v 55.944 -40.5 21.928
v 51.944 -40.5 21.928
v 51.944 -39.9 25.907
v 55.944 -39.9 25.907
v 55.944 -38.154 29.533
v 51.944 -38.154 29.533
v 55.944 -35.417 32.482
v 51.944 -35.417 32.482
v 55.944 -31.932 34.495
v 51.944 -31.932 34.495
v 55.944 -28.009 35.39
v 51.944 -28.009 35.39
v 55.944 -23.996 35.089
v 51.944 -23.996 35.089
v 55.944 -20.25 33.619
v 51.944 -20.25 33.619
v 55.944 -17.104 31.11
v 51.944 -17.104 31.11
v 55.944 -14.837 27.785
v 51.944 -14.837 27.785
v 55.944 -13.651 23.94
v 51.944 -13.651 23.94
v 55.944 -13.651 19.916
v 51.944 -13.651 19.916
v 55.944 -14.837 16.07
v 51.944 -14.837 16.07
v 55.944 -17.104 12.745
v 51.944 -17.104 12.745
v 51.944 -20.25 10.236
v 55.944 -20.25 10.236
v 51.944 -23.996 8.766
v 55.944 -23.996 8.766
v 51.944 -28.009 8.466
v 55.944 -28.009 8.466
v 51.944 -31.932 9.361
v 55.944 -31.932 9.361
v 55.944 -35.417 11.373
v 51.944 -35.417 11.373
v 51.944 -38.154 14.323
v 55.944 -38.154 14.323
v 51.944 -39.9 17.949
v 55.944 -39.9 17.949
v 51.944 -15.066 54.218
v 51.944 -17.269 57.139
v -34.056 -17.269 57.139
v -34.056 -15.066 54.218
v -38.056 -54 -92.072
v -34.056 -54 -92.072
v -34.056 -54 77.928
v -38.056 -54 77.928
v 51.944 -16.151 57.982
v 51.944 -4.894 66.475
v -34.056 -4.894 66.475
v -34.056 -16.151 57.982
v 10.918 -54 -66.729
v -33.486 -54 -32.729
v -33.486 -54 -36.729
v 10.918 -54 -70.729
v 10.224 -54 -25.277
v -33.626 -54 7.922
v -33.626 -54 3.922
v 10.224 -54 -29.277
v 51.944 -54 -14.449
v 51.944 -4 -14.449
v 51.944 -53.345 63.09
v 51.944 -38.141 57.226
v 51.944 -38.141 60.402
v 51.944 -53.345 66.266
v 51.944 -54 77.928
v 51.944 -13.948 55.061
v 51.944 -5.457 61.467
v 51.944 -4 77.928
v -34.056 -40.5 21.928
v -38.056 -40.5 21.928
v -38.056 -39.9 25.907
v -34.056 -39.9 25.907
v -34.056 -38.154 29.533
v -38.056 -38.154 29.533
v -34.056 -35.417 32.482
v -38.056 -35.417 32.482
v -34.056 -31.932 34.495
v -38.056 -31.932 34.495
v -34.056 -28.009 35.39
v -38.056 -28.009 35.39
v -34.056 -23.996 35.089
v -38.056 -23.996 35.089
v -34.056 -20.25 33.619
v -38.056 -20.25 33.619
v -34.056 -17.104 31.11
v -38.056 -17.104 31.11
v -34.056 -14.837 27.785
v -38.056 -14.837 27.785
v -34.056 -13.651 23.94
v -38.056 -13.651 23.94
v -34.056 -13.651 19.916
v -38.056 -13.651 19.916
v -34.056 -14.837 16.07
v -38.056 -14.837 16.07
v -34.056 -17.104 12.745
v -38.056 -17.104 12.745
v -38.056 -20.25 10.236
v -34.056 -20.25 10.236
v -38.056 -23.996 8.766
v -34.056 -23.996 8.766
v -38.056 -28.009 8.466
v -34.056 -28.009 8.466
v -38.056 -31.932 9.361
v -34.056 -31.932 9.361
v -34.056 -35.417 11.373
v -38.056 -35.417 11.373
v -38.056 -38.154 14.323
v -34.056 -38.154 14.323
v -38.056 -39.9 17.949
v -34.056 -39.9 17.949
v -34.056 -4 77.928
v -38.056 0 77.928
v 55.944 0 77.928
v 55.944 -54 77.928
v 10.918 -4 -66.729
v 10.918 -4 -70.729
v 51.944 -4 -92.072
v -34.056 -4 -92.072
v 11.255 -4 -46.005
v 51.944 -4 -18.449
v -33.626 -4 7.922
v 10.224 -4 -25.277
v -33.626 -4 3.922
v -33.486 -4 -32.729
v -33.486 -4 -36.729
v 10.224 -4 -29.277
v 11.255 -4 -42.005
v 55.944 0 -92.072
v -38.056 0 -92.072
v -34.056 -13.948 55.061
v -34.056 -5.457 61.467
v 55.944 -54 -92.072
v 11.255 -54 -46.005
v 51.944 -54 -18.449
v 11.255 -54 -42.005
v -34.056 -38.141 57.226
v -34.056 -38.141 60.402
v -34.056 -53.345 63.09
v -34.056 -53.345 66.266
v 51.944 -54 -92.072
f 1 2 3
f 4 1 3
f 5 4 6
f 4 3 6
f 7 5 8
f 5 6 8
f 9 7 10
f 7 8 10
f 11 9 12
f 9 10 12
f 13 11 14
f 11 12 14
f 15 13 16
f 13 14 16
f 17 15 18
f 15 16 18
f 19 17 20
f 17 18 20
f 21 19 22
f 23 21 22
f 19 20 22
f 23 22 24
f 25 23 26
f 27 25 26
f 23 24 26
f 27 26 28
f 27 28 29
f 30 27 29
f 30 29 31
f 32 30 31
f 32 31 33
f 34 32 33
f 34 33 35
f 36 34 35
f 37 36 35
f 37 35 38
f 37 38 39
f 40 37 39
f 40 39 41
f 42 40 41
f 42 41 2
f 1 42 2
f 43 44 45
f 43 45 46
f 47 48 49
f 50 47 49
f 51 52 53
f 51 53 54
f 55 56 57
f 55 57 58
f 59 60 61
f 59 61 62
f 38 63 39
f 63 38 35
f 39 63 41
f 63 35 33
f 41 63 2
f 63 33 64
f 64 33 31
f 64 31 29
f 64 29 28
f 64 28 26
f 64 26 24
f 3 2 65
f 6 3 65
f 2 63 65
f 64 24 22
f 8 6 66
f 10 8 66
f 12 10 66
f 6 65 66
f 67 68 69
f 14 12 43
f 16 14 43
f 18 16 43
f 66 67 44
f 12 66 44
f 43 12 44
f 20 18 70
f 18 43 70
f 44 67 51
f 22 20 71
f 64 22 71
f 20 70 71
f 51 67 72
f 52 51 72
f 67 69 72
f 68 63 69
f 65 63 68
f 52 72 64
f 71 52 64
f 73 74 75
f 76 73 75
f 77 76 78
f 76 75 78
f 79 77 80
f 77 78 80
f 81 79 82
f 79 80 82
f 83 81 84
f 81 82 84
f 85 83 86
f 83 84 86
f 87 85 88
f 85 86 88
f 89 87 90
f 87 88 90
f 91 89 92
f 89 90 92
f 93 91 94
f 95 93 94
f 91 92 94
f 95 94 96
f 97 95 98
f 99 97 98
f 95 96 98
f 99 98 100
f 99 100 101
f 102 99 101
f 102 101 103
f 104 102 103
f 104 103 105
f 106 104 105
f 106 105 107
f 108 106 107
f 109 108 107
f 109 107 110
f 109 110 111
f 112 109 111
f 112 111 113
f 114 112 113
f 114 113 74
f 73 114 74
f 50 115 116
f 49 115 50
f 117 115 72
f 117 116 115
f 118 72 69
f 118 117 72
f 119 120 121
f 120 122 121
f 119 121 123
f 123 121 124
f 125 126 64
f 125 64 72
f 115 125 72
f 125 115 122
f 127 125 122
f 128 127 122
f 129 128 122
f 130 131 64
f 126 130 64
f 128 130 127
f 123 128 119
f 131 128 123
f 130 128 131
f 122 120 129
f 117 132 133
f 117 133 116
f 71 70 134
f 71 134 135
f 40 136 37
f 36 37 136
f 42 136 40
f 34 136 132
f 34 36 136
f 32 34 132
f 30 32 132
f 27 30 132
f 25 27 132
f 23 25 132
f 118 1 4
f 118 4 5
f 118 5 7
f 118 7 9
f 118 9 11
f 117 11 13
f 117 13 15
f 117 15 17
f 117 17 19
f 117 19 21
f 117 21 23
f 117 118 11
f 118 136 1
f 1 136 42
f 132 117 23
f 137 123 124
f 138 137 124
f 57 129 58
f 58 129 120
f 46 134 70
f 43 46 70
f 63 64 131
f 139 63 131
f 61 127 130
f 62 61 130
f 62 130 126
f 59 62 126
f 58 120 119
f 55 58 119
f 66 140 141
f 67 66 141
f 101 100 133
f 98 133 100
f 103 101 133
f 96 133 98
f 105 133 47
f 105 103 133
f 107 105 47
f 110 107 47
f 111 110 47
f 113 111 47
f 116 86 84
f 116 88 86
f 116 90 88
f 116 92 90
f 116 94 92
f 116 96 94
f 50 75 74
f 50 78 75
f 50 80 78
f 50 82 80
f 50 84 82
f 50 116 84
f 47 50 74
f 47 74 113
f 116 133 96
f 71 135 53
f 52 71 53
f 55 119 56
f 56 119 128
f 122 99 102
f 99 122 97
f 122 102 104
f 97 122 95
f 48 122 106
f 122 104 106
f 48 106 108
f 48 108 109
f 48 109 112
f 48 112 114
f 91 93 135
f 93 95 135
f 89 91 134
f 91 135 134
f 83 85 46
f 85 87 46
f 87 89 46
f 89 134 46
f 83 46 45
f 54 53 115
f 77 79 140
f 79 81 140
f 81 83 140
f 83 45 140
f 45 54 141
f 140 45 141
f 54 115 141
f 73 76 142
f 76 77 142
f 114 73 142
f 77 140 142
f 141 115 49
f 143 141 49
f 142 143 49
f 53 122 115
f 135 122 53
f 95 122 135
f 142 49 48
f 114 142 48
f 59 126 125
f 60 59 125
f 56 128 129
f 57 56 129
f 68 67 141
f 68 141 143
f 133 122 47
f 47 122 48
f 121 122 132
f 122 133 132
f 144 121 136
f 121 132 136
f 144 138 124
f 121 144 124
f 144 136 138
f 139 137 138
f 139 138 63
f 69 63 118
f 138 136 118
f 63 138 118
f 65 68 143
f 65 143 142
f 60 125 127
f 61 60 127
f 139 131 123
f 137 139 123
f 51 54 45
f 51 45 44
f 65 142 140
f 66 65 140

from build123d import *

# Parameters (mm, degrees)
F0_W      = 90
F0_H      = 170
F1_DEPTH  = 4
F2_W      = 50
F2_H      = 170
F3_DEPTH  = 4
F4_W      = 50
F4_H      = 170
F5_DEPTH  = 4
F6_DEPTH  = 4
F9_D      = 27
F13_DEPTH = 88.2
F15_DEPTH = 87.7
F16_DEPTH = 1.4
F21_DEPTH = 50
F23_DEPTH = 50
F25_DEPTH = 50


with BuildPart() as f1:
    # F0 (on Front) → F1 (new body)
    with BuildSketch(Plane.XZ):
        with Locations((10.9441001713, -7.0722334087)):
            Rectangle(F0_W, F0_H)
    extrude(amount=F1_DEPTH)

    # F2 (on face) → F3 (join)
    with BuildSketch(Plane.YZ.offset(55.9441001713)):
        with Locations((-29, -7.0722334087)):
            Rectangle(F2_W, F2_H)
    extrude(amount=-F3_DEPTH)


with BuildPart() as f5:
    # F4 (on face) → F5 (new body)
    with BuildSketch(Plane(origin=(-34.0558998287, 0, 0), x_dir=(0, -1, 0), z_dir=(-1, 0, 0))):
        with Locations((29, -7.0722334087)):
            Rectangle(F4_W, F4_H)
    extrude(amount=F5_DEPTH)


with BuildPart() as f6:
    # F6 (new): a face of the model
    f6_faces = [f5.part.faces().sort_by_distance(p)[0] for p in [
        (-36.0558998287, -4, -7.0722334087),
    ]]
    extrude(f6_faces, amount=F6_DEPTH)


with BuildPart() as f1_1:
    add(f1.part)

    # F7: union F6, F5
    add(f6.part)
    add(f5.part)

    # F9 (through all)
    with Locations(Plane.YZ.offset(55.9441001713)):
        with Locations((-27, 21.9277665913)):
            Hole(F9_D / 2)

    # F12 (on face) → F13 (join)
    with BuildSketch(Plane.YZ.offset(-34.0558998287)):
        Polygon((-38.1409525871, 60.4024082422), (-53.344592452, 66.2663727999), (-53.344592452, 63.0900636315), (-38.1409525871, 57.2260990739), align=None)
    extrude(amount=F13_DEPTH)

    # F14 (on face) → F15 (join)
    with BuildSketch(Plane.YZ.offset(-34.0558998287)):
        Polygon((-5.4573006312, 61.4672620258), (-4.8942677677, 66.4745345712), (-16.1511674523, 57.9817742109), (-13.9479605441, 55.0614893921), align=None)
    extrude(amount=F15_DEPTH)

    # F16 (add): a face of the model
    f16_faces = [f1_1.faces().sort_by_distance(p)[0] for p in [
        (8.9441001713, -15.0495639982, 56.5216318015),
    ]]
    extrude(f16_faces, amount=F16_DEPTH)

    # F20 (on face) → F21 (join)
    with BuildSketch(Plane.XZ.offset(4)):
        Polygon((10.2237635952, -25.2774868811), (-33.625573637, 7.9224472197), (-33.625573637, 3.9224472197), (10.2237635952, -29.2774868811), align=None)
    extrude(amount=F21_DEPTH)

    # F22 (on face) → F23 (join)
    with BuildSketch(Plane.XZ.offset(4)):
        Polygon((55.5519397916, -16.0052882843), (55.5519397916, -12.0052882843), (11.254648678, -42.0052882843), (11.254648678, -46.0052882843), align=None)
    extrude(amount=F23_DEPTH)

    # F24 (on face) → F25 (join)
    with BuildSketch(Plane.XZ.offset(4)):
        Polygon((5.6939503777, -62.7291997522), (-33.4860496223, -32.7291997522), (-33.4860496223, -36.7291997522), (5.6939503777, -66.7291997522), (10.9179503777, -70.7291997522), (10.9179503777, -66.7291997522), align=None)
    extrude(amount=F25_DEPTH)


solid = f1_1.part
